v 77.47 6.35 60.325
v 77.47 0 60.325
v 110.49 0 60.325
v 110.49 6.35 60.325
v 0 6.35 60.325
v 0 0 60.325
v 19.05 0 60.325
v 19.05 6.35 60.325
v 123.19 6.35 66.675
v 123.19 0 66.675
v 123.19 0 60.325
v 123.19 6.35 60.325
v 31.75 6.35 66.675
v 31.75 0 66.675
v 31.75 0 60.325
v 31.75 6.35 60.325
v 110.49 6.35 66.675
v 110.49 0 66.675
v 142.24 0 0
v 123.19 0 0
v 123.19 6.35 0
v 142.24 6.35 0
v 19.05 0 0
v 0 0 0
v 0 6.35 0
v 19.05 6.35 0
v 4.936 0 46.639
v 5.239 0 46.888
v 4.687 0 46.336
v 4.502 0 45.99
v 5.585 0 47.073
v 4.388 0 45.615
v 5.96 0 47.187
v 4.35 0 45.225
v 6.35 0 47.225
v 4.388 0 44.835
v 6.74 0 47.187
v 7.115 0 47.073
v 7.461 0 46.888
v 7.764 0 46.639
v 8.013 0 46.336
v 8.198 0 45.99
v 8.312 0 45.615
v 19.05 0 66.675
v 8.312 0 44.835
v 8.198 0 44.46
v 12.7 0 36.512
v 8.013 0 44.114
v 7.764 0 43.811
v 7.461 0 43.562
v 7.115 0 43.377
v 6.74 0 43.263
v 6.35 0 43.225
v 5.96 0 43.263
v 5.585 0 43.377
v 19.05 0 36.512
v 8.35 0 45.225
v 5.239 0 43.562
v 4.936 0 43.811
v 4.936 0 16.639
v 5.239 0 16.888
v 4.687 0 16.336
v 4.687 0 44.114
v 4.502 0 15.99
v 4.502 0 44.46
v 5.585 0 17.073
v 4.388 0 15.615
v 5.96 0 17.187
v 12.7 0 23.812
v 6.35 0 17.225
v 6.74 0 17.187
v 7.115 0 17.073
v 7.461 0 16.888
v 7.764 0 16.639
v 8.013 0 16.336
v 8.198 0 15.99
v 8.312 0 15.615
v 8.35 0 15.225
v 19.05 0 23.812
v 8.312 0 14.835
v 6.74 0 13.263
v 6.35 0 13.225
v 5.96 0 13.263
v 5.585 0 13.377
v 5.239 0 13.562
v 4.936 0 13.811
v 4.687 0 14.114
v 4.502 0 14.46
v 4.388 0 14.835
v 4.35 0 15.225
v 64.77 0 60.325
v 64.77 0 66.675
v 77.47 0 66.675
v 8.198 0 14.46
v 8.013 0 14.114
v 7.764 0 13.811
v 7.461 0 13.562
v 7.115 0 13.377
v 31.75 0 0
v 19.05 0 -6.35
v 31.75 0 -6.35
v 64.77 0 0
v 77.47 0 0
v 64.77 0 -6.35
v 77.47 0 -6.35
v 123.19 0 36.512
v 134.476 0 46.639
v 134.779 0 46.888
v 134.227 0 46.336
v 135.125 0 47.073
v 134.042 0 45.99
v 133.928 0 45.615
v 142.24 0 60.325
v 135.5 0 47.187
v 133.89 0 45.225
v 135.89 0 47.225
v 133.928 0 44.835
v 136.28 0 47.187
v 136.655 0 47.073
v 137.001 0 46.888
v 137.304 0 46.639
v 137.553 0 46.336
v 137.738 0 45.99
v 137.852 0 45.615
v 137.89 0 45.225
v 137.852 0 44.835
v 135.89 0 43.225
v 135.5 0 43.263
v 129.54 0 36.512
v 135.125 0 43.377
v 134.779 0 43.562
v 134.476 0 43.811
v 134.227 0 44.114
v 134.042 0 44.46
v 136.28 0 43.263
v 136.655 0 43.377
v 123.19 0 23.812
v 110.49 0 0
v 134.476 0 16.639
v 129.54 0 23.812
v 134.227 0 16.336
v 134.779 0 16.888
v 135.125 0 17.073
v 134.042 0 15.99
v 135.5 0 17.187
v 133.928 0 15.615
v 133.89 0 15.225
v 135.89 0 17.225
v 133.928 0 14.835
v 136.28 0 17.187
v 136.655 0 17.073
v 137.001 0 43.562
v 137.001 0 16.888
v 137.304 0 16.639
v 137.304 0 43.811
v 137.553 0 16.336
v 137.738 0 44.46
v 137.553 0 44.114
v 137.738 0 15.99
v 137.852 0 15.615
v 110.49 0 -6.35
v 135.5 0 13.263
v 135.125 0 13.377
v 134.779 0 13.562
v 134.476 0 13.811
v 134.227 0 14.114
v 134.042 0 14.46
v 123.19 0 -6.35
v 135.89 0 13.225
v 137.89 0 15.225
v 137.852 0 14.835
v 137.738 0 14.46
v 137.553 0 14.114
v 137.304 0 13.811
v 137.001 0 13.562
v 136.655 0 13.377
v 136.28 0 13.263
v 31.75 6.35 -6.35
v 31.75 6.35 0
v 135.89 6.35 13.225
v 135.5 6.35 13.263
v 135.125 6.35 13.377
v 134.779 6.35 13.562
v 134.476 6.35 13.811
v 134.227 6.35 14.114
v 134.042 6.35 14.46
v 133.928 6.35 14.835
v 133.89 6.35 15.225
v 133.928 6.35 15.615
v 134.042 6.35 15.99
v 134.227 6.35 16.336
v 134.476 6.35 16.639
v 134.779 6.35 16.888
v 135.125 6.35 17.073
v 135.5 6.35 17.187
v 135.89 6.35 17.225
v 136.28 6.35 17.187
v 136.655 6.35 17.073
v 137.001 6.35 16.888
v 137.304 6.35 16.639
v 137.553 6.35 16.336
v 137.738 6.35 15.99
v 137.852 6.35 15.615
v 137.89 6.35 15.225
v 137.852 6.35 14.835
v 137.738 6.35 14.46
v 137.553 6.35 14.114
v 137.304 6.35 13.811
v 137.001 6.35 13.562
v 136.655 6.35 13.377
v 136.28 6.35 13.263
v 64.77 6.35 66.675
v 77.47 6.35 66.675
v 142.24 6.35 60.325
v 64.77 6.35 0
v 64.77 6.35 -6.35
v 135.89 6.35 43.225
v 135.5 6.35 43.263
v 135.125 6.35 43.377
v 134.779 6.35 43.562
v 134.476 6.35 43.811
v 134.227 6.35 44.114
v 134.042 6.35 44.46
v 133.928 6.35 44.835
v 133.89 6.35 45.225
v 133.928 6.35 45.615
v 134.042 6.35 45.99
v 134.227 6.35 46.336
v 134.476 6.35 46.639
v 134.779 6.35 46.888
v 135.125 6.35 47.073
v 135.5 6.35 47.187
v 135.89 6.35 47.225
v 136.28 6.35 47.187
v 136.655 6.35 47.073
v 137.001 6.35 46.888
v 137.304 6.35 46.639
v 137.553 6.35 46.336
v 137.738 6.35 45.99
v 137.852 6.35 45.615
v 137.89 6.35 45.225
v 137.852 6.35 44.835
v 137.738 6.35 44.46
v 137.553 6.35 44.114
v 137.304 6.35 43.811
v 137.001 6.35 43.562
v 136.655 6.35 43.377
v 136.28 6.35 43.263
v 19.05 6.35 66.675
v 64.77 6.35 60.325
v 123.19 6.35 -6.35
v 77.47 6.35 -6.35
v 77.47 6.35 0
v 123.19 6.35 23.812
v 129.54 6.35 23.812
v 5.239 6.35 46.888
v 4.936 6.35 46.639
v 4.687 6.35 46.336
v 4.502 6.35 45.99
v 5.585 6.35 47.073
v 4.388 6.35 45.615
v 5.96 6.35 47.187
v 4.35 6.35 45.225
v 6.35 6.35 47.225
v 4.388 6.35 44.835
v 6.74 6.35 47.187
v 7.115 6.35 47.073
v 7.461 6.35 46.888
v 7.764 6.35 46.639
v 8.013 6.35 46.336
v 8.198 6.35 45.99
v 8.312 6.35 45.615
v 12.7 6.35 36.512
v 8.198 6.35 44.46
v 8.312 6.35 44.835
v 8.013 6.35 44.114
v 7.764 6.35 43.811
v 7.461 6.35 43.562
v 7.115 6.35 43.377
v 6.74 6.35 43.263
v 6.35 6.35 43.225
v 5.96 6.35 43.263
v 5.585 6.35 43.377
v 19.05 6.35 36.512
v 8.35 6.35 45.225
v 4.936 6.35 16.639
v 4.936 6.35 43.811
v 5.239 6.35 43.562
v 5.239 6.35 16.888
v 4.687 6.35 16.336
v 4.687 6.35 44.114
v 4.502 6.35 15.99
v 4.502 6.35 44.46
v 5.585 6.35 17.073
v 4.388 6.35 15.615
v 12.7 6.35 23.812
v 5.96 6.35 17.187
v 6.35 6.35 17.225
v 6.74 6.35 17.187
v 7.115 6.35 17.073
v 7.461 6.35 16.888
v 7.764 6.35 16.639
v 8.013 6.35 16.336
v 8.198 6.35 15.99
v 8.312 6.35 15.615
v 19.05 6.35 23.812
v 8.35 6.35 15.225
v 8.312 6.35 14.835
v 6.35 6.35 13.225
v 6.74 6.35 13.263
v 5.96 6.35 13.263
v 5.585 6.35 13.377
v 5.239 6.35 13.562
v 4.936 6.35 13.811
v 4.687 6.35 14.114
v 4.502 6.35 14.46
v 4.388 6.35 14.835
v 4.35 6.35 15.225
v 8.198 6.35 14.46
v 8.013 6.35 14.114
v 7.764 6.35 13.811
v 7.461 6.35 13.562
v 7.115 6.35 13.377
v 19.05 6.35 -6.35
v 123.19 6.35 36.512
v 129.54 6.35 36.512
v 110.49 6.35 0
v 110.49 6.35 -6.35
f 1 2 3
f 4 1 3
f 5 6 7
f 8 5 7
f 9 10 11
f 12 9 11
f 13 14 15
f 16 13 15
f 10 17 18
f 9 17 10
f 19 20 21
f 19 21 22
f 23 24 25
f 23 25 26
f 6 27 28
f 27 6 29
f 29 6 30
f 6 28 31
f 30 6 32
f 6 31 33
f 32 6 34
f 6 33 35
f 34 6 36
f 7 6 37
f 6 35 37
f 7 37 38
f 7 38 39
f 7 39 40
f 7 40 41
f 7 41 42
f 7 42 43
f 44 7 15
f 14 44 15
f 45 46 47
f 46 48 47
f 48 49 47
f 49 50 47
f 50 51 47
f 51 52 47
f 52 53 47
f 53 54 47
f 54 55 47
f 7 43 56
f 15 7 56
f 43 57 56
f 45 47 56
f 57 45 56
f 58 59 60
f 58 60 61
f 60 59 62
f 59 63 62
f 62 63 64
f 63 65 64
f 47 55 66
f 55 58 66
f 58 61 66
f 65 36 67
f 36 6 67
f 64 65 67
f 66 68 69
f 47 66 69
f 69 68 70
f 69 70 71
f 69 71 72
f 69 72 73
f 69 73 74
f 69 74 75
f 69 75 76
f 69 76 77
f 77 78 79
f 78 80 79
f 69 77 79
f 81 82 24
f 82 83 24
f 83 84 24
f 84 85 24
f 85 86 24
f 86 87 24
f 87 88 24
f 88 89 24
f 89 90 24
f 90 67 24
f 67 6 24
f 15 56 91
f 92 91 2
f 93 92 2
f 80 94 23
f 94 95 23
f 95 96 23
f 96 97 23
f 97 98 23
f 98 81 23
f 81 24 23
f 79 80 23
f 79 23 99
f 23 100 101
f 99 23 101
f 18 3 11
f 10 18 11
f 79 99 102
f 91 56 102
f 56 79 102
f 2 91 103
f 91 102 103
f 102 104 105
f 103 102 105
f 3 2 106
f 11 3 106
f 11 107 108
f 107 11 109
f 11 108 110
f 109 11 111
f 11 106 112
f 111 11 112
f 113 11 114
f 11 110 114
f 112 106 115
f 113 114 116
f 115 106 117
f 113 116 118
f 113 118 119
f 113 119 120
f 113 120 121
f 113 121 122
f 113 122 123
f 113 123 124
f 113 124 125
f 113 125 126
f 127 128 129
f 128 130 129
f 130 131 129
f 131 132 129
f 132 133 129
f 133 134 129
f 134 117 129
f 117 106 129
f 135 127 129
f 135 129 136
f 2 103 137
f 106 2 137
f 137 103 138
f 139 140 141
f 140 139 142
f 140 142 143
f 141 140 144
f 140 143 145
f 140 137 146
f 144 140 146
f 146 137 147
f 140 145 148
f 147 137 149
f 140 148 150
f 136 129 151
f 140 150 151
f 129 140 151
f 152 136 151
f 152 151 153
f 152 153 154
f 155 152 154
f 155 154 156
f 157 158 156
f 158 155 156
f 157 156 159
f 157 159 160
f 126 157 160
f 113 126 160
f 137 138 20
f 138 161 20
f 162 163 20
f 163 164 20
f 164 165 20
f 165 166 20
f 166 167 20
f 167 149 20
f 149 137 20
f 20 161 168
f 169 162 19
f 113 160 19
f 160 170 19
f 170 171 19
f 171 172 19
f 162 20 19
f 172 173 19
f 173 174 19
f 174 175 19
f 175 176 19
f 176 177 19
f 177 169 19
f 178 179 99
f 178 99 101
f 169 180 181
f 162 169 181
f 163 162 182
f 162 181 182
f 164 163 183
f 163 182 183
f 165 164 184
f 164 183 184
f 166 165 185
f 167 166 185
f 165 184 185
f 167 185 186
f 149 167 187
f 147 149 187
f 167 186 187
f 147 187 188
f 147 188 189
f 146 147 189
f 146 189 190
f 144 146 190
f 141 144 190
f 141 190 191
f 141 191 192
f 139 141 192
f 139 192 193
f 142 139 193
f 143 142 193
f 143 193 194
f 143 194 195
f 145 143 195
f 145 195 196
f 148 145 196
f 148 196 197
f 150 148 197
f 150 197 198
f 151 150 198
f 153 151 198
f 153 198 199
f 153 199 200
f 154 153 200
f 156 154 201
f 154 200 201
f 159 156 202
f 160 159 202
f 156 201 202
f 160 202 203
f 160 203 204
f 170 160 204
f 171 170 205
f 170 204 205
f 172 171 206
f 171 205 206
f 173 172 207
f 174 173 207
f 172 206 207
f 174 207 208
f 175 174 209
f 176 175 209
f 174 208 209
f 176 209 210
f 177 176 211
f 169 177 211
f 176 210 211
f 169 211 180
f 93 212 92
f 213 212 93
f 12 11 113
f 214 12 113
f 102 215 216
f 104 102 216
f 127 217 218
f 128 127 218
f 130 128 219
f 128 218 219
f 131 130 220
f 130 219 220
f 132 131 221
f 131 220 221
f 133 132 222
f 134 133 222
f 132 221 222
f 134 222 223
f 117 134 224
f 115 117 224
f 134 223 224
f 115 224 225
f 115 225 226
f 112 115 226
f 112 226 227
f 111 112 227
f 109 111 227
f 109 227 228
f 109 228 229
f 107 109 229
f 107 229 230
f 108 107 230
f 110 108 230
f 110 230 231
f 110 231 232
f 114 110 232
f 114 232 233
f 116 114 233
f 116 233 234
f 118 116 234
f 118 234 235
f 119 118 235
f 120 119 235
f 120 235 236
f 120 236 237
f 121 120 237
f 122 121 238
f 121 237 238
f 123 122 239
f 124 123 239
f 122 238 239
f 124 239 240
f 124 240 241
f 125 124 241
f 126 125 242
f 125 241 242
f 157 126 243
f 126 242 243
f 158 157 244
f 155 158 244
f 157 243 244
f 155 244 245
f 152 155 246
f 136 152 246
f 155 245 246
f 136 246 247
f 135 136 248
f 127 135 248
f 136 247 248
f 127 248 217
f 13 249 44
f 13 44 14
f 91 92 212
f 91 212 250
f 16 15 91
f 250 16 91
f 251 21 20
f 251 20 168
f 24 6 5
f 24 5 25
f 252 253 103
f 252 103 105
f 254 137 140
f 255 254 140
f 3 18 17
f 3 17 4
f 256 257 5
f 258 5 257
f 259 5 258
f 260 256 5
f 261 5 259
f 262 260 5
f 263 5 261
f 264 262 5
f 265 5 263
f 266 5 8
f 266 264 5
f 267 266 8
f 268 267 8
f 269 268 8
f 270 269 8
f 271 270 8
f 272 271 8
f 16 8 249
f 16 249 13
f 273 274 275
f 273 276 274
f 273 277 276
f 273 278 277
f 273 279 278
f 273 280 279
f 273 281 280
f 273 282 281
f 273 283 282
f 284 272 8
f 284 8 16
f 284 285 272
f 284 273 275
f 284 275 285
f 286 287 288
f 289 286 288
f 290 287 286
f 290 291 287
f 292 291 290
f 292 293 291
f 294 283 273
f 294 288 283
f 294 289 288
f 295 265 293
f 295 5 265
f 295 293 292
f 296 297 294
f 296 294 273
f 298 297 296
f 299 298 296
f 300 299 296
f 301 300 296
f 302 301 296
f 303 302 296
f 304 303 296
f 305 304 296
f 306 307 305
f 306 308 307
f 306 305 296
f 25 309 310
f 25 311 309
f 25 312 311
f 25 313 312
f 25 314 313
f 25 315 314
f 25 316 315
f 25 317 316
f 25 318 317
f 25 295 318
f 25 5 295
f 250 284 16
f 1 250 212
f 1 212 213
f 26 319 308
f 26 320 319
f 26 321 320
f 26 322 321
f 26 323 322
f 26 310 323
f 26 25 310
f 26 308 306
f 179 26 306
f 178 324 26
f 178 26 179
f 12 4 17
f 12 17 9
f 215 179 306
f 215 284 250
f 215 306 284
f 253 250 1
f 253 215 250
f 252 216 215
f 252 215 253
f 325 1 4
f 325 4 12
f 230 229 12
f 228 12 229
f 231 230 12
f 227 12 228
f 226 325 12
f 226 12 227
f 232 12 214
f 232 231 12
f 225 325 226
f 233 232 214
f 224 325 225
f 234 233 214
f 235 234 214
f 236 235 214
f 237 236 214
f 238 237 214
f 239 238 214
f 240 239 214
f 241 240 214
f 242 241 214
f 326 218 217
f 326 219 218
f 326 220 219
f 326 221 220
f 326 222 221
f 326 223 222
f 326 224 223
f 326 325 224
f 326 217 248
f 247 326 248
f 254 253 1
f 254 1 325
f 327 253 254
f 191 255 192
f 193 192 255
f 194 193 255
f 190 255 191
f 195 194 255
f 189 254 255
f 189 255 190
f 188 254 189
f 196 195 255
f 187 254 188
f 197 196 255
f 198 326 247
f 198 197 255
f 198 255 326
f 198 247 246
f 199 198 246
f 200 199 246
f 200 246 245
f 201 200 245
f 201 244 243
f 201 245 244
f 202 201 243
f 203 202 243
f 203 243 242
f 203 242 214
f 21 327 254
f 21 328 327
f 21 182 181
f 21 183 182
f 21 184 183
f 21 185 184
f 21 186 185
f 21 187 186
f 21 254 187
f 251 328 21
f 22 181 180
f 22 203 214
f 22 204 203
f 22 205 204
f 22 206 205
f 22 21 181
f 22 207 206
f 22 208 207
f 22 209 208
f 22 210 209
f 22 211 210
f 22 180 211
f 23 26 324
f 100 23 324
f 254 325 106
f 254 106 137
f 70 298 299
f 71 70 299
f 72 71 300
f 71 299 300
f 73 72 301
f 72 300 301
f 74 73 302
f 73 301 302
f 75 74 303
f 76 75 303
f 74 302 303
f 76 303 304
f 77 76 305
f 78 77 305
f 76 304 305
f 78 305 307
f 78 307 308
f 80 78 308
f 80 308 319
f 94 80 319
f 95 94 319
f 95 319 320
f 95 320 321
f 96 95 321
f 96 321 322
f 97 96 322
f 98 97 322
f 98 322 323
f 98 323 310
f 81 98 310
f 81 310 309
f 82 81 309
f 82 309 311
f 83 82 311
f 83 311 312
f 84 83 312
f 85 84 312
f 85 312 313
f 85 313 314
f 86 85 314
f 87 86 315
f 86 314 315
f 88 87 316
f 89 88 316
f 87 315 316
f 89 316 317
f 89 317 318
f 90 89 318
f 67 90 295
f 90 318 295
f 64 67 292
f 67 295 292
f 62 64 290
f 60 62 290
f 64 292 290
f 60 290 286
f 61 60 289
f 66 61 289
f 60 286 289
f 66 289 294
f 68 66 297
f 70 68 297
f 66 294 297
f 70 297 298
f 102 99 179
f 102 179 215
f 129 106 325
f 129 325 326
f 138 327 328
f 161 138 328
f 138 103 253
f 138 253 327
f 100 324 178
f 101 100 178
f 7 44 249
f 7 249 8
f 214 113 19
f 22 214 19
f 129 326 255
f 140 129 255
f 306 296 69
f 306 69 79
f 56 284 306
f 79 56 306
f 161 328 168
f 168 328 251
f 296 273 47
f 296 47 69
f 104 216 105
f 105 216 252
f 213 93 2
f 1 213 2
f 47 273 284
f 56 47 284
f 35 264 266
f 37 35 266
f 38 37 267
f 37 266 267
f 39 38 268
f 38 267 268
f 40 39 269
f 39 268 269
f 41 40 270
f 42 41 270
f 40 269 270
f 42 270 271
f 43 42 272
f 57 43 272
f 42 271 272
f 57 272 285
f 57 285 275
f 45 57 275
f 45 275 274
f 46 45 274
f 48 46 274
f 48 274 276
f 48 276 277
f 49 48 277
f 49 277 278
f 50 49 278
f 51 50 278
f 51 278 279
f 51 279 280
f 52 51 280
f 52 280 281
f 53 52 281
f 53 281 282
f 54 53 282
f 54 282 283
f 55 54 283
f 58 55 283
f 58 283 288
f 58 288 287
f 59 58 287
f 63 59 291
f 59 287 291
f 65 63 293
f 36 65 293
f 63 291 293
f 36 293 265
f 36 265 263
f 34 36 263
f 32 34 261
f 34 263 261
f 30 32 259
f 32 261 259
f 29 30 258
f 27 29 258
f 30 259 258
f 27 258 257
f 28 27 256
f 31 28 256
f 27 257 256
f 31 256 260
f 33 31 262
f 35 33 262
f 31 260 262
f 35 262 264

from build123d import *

# Parameters (mm, degrees)
SKETCH1_W           = 142.24
SKETCH1_H           = 60.325
BOSS_EXTRUDE1_DEPTH = 6.35
SKETCH2_R           = 2
SKETCH2_W           = 6.35
SKETCH2_H           = 12.7
CUT_EXTRUDE1_DEPTH  = 155.633908717
SKETCH3_W           = 12.7
SKETCH3_H           = 6.35
BOSS_EXTRUDE2_DEPTH = 6.35


with BuildPart() as part:
    # Sketch1 → Boss-Extrude1 (new body)
    with BuildSketch(Plane(origin=(0, 0, 0), x_dir=(1, 0, 0), z_dir=(0, 1, 0))):
        with Locations((71.12, -30.1625)):
            Rectangle(SKETCH1_W, SKETCH1_H)
    extrude(amount=BOSS_EXTRUDE1_DEPTH)

    # Sketch2 → Cut-Extrude1 (cut, through all)
    with BuildSketch(Plane(origin=(0, 6.35, 0), x_dir=(1, 0, 0), z_dir=(0, 1, 0))):
        with Locations(Location((6.35, -15.225, 0), (0, 0, 270))):
            Circle(SKETCH2_R)
        with Locations(Location((6.35, -45.225, 0), (0, 0, 270))):
            Circle(SKETCH2_R)
        with Locations(Location((135.89, -45.225, 0), (0, 0, 90))):
            Circle(SKETCH2_R)
        with Locations(Location((135.89, -15.225, 0), (0, 0, 90))):
            Circle(SKETCH2_R)
        with Locations((126.365, -30.1625)):
            Rectangle(SKETCH2_W, SKETCH2_H)
        with Locations((15.875, -30.1625)):
            Rectangle(SKETCH2_W, SKETCH2_H)
    extrude(amount=-CUT_EXTRUDE1_DEPTH, mode=Mode.SUBTRACT)

    # Sketch3 → Boss-Extrude2 (add)
    with BuildSketch(Plane(origin=(0, 6.35, 0), x_dir=(1, 0, 0), z_dir=(0, 1, 0))):
        with Locations((25.4, 3.175)):
            Rectangle(SKETCH3_W, SKETCH3_H)
        with Locations((116.84, 3.175)):
            Rectangle(SKETCH3_W, SKETCH3_H)
        with Locations((116.84, -63.5)):
            Rectangle(SKETCH3_W, SKETCH3_H)
        with Locations((25.4, -63.5)):
            Rectangle(SKETCH3_W, SKETCH3_H)
        with Locations((71.12, -63.5)):
            Rectangle(SKETCH3_W, SKETCH3_H)
        with Locations((71.12, 3.175)):
            Rectangle(SKETCH3_W, SKETCH3_H)
    extrude(amount=-BOSS_EXTRUDE2_DEPTH)


solid = part.part
